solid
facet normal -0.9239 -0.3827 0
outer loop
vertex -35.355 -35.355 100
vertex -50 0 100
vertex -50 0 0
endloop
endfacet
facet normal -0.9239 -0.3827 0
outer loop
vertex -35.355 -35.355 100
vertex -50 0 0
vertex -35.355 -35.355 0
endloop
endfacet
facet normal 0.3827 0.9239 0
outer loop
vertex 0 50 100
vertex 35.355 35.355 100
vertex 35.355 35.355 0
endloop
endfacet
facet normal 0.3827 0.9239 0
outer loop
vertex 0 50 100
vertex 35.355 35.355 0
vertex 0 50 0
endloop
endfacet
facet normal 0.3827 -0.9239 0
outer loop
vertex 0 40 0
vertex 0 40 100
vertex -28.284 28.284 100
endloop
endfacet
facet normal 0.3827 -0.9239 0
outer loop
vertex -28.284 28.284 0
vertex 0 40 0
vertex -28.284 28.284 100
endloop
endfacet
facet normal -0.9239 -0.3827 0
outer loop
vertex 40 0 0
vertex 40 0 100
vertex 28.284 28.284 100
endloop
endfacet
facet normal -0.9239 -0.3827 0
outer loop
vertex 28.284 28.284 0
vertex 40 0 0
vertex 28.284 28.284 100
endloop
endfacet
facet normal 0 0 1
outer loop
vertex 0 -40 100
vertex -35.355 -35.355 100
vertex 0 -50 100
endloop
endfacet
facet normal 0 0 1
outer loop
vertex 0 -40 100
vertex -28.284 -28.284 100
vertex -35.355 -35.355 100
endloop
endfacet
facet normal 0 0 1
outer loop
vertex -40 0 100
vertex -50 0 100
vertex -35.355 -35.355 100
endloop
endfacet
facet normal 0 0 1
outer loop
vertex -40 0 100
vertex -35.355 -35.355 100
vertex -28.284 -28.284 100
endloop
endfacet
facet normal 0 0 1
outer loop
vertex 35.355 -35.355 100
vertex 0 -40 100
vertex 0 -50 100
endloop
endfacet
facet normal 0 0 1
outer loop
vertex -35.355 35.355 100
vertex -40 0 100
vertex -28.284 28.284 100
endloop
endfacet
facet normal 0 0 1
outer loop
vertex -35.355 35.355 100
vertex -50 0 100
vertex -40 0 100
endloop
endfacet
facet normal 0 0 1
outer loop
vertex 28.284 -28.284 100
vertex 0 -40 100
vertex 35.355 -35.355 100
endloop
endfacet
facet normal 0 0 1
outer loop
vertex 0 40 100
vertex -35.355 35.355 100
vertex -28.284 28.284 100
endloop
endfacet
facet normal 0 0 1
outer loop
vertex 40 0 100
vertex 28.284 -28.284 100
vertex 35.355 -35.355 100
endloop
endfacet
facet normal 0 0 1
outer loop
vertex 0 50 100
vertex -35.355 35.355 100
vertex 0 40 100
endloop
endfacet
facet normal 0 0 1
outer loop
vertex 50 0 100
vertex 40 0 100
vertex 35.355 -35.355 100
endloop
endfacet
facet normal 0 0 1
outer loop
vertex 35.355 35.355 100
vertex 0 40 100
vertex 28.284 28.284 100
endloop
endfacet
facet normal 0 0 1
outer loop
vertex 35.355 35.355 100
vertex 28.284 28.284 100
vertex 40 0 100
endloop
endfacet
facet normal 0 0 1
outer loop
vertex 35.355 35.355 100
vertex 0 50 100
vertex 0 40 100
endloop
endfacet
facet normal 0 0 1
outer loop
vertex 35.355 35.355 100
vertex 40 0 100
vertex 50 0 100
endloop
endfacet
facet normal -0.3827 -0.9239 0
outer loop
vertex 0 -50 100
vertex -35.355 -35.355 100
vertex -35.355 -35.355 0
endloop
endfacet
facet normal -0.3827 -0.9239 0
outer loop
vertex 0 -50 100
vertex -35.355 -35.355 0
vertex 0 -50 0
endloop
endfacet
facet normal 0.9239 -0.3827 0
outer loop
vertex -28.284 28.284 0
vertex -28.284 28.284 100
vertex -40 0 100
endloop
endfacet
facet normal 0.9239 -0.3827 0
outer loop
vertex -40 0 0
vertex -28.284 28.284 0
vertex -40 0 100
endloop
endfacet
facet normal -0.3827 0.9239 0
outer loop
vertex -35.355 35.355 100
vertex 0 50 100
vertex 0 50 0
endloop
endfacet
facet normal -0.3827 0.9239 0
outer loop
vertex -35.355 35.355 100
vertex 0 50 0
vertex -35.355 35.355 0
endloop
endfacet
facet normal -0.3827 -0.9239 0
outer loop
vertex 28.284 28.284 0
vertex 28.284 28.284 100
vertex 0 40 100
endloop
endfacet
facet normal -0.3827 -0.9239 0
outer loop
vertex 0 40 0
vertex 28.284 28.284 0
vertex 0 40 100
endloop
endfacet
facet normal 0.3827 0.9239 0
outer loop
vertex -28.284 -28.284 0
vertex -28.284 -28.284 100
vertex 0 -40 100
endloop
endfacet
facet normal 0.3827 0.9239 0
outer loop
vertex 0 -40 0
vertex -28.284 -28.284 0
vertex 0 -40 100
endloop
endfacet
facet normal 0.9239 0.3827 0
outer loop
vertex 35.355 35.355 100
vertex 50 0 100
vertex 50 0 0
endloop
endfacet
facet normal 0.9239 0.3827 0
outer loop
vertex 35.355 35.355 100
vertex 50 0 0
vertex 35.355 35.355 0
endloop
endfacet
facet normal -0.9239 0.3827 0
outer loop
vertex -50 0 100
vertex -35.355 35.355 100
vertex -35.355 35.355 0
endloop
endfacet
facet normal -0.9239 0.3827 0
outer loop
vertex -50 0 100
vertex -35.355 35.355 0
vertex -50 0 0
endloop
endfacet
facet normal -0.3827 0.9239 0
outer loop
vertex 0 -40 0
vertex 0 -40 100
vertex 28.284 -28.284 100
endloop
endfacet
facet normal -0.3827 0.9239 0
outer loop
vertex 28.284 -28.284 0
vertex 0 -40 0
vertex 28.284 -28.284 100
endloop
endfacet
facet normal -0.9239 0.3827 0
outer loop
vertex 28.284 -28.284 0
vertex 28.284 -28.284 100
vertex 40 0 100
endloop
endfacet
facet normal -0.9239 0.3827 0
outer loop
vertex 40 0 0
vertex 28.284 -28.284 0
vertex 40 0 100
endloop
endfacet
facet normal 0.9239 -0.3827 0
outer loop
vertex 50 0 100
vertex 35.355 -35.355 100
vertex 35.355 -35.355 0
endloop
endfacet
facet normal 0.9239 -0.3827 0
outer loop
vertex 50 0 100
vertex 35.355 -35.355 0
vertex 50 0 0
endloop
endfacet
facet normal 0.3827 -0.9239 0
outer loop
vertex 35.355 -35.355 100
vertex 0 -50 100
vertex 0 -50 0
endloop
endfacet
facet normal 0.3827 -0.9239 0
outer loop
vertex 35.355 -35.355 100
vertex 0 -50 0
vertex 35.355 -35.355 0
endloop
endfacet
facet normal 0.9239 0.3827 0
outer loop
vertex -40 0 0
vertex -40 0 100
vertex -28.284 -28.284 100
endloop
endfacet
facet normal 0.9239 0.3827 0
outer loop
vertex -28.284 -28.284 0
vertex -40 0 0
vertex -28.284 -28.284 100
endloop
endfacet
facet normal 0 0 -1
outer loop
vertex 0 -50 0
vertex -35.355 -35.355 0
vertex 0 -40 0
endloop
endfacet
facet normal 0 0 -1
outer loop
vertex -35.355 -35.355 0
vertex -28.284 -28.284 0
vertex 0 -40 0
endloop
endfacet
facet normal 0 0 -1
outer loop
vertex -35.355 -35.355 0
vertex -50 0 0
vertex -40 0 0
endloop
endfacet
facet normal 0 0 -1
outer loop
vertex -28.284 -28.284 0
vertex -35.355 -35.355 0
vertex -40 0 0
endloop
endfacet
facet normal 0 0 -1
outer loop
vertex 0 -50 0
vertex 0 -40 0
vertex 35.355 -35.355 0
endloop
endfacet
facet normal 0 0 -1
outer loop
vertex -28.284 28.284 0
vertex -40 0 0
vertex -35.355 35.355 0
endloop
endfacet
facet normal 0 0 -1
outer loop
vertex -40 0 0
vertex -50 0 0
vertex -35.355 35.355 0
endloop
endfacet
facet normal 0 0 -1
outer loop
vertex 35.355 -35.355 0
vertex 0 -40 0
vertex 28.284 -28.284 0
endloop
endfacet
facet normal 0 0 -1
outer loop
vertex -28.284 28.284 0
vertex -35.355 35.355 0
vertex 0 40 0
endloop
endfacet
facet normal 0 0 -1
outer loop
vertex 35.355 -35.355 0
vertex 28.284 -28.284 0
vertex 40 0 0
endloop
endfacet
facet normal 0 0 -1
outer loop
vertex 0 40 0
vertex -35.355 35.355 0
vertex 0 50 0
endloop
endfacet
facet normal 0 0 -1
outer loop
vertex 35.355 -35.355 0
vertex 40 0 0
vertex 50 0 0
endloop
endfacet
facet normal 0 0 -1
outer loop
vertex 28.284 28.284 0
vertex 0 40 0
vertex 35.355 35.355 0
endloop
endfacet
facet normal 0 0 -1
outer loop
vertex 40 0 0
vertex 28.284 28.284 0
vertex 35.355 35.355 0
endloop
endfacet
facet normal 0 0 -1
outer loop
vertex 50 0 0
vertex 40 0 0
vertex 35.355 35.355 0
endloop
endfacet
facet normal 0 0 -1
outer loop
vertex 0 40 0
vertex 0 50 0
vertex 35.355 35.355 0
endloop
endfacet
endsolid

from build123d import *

# Parameters (mm, degrees)
F1_DEPTH = 100
F3_DEPTH = 105.41


with BuildPart() as f1:
    # F0 (on Top) → F1 (new body)
    with BuildSketch(Plane.XY):
        Polygon((35.355339, 35.355339), (0, 50), (-35.355339, 35.355339), (-50, 0), (-35.355339, -35.355339), (0, -50), (35.355339, -35.355339), (50, 0), align=None)
    extrude(amount=F1_DEPTH)

    # F2 (on Top) → F3 (cut)
    with BuildSketch(Plane.XY):
        Polygon((-40, 0), (-28.284271, -28.284271), (0, -40), (28.284271, -28.284271), (40, 0), (28.284271, 28.284271), (0, 40), (-28.284271, 28.284271), align=None)
    extrude(amount=F3_DEPTH, mode=Mode.SUBTRACT)


solid = f1.part
